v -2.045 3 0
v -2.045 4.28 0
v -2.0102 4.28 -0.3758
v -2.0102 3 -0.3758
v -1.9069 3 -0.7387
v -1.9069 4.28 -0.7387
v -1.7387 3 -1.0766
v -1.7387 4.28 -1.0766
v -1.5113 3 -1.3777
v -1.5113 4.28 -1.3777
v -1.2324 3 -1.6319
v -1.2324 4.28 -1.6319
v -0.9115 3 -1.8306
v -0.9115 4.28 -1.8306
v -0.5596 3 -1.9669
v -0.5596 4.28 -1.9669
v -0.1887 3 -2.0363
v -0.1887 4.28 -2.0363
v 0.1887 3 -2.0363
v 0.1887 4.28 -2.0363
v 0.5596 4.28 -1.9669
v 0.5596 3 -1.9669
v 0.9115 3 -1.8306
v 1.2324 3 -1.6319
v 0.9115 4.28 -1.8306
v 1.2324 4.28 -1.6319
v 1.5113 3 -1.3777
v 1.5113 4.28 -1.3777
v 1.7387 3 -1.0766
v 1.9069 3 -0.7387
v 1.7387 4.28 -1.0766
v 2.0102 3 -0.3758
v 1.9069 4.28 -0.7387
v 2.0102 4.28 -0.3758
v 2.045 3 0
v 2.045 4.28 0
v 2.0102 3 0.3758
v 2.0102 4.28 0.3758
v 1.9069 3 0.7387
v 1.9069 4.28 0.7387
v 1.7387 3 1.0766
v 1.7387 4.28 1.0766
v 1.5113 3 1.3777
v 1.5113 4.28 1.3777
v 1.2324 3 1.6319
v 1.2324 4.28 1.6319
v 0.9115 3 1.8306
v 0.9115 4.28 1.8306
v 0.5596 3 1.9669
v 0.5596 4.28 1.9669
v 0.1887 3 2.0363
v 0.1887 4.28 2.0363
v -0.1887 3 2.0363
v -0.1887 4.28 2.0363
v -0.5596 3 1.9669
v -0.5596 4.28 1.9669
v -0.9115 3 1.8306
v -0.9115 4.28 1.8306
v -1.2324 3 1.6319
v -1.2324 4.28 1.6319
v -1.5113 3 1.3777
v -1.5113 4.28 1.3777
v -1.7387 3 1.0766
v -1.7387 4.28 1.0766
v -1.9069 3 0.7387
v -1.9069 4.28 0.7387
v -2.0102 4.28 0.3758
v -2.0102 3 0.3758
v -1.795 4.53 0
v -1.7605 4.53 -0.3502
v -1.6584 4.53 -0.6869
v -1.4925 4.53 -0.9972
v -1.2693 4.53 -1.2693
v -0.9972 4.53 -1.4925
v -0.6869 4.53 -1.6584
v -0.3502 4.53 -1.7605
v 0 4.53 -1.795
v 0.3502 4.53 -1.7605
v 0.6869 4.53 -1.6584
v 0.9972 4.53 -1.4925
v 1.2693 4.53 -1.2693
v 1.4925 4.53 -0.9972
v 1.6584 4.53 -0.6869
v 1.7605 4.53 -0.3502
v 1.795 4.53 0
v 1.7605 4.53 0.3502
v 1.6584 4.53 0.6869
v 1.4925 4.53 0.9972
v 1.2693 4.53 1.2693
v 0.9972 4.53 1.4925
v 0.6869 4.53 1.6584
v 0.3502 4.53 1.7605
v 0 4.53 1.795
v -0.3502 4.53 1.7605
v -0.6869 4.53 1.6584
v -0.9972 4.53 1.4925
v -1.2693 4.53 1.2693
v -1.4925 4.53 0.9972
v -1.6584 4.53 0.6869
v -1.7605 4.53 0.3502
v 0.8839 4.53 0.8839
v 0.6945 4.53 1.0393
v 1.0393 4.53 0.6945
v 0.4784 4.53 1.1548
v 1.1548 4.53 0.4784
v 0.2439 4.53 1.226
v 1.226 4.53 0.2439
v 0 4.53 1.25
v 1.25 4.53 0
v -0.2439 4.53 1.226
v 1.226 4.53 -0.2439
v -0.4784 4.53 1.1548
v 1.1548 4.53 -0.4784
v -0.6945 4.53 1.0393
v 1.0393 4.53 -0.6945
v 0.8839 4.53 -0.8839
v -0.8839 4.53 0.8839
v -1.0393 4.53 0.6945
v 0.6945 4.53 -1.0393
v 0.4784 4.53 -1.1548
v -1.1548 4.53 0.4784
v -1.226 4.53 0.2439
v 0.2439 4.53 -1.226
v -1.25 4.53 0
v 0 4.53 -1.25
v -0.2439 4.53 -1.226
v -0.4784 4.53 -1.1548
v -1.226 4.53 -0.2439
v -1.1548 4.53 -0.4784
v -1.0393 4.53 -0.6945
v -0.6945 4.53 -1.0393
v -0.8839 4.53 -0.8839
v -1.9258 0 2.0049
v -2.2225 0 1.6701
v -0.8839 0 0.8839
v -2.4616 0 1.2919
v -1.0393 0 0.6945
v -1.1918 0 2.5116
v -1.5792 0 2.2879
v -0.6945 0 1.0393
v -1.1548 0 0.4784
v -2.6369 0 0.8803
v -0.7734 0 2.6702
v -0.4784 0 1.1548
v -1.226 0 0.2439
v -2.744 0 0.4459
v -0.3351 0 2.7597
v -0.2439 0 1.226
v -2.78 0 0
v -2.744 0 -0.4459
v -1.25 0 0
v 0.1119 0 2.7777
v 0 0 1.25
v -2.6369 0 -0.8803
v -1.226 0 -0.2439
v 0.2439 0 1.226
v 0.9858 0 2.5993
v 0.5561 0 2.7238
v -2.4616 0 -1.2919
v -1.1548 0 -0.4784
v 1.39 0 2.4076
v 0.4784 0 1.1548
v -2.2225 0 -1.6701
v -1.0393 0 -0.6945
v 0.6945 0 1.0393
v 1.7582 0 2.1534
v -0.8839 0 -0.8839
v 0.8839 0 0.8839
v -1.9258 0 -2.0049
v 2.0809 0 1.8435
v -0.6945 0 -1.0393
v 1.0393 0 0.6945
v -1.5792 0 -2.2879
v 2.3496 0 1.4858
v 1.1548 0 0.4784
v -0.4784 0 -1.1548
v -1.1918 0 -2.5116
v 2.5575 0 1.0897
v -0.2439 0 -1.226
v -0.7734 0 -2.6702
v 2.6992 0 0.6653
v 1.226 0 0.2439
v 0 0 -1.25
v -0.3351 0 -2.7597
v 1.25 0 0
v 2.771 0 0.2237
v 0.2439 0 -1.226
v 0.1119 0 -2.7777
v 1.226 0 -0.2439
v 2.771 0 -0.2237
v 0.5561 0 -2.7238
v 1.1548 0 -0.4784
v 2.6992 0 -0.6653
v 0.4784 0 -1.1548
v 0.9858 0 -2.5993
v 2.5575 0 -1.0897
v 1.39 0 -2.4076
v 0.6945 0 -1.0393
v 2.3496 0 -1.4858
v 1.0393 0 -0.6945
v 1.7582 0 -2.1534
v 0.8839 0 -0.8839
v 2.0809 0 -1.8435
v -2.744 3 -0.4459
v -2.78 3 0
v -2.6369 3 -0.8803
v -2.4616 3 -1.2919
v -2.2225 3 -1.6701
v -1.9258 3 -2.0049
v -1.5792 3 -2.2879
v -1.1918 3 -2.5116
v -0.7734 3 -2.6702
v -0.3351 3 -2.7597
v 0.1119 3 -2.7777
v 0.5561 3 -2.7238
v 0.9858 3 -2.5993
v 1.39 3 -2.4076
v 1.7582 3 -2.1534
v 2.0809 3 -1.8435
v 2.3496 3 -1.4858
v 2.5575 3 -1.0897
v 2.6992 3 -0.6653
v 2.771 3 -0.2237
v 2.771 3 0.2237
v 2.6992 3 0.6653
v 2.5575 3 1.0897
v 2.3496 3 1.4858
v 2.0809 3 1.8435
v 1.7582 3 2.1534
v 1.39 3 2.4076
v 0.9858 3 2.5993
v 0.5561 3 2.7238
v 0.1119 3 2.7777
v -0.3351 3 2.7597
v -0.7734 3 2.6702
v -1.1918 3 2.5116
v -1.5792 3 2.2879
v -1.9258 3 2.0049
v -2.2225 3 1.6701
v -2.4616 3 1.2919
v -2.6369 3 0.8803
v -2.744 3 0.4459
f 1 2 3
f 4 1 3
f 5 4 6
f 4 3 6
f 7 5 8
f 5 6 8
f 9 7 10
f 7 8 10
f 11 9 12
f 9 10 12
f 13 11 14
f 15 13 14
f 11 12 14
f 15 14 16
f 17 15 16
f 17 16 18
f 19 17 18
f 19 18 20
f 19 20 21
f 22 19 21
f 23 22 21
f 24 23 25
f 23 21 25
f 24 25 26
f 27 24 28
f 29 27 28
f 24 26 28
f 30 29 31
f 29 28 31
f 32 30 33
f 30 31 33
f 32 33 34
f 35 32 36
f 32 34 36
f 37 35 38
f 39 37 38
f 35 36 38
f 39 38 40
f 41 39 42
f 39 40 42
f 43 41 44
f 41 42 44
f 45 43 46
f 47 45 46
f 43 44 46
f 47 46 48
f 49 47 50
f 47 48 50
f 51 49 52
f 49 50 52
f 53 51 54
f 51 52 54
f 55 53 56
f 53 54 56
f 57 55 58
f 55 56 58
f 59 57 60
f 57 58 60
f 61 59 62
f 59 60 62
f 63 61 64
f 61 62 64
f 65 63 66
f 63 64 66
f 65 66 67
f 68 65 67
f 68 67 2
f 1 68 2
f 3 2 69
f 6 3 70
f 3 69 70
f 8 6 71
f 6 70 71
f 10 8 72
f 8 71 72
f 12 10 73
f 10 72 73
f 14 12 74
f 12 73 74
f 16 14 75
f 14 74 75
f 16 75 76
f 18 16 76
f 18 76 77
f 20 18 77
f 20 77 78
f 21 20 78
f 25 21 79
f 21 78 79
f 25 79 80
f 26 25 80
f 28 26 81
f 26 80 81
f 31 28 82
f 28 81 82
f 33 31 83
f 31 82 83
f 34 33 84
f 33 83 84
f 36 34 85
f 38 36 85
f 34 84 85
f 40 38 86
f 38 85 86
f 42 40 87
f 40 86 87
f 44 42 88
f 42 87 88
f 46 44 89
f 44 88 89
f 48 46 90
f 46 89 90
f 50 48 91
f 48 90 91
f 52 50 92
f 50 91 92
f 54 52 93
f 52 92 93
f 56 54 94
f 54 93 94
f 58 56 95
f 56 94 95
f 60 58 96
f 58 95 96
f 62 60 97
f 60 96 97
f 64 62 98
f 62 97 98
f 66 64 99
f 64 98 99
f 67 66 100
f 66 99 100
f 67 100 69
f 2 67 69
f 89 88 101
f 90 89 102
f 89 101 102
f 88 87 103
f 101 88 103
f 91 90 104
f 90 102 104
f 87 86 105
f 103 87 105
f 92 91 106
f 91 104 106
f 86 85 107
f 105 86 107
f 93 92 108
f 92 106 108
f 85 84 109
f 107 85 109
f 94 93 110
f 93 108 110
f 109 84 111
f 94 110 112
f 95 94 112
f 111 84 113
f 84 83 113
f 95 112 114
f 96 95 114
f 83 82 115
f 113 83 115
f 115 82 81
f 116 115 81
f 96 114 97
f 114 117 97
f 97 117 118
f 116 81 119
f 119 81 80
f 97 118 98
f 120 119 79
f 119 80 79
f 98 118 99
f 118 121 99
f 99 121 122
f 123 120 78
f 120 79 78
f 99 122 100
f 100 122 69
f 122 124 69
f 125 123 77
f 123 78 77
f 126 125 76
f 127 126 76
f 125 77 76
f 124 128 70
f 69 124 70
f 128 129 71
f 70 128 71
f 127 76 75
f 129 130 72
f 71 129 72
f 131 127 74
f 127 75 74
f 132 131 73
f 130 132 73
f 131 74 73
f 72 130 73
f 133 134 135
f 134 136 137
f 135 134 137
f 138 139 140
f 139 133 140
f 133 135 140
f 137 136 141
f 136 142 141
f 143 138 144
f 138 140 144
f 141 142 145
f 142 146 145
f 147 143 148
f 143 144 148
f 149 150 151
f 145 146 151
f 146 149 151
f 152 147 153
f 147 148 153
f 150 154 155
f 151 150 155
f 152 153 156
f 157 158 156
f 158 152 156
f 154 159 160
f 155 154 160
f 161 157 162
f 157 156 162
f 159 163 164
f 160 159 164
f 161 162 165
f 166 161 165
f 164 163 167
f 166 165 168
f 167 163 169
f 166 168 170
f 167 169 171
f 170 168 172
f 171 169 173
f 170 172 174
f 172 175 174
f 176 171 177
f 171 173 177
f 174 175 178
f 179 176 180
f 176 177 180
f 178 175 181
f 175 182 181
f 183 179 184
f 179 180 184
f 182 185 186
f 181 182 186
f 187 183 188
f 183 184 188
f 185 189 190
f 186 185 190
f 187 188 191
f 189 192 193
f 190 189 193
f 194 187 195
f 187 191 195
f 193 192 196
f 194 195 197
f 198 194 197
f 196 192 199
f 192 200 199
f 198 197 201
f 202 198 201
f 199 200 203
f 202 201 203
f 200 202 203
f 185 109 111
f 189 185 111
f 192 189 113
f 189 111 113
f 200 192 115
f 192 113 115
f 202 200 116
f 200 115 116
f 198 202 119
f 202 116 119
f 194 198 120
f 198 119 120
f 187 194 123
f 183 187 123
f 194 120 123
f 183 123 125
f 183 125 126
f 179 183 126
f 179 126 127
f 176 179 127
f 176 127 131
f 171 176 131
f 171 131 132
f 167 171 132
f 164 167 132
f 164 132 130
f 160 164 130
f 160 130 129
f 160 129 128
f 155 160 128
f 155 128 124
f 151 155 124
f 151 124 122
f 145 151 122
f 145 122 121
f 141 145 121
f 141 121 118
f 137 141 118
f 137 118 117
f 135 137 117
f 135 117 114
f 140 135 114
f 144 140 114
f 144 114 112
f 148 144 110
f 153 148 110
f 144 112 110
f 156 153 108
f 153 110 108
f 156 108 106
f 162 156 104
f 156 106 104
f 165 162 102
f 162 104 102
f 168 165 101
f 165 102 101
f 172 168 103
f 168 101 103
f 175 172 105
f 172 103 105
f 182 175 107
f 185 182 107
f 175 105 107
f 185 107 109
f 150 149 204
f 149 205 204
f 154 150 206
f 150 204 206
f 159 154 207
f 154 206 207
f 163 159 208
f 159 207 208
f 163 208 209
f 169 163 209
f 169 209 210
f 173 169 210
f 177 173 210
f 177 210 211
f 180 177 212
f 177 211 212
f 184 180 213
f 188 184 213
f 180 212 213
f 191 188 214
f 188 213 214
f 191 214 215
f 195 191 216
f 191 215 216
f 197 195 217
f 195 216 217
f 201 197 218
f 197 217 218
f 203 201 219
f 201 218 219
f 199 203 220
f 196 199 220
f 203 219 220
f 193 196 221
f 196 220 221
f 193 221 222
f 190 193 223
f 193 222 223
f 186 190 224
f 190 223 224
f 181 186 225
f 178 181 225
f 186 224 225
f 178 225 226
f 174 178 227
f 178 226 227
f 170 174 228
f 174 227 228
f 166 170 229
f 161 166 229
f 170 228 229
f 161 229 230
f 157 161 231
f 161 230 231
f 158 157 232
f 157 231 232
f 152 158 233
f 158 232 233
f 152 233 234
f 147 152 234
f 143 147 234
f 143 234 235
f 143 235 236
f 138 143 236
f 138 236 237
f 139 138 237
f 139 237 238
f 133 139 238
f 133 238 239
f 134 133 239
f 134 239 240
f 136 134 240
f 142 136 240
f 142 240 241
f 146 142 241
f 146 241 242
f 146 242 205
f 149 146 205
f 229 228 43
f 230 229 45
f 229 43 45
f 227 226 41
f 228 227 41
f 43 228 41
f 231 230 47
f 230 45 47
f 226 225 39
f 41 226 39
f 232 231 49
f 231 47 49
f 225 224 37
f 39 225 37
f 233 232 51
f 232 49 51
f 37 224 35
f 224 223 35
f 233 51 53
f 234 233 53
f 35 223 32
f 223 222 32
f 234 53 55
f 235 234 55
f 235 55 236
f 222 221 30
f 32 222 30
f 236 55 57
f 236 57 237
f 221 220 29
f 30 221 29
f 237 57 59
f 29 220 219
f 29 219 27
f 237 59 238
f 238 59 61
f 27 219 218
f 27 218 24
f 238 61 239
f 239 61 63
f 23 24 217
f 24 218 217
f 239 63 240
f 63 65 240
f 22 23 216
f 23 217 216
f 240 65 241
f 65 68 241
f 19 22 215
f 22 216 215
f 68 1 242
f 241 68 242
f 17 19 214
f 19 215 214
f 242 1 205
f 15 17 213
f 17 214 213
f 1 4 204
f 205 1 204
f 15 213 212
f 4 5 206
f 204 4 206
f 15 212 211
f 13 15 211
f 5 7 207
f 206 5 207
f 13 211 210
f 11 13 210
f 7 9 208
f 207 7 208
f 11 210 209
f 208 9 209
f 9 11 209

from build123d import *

# Parameters (mm, degrees)
TIP_CHAMFER_SIZE = 0.25
M3_TAPPED_HOLE_D = 2.5


with BuildPart() as part:
    # Body Sketch → Body Revolve (revolve)
    with BuildSketch(Plane.XY, mode=Mode.PRIVATE) as body_revolve_sk:
        Polygon((0, 0), (2.78, 0), (2.78, 3), (2.045, 3), (2.045, 4.53), (0, 4.53), align=None)
    revolve(body_revolve_sk.sketch.rotate(Axis((0, 4.53, 0), (0, -1, 0)), 180), axis=Axis((0, 4.53, 0), (0, -1, 0)))

    # Tip Chamfer
    tip_chamfer_edges = [part.edges().sort_by_distance(p)[0] for p in [
        (2.045, 4.53, 0),
    ]]
    chamfer(tip_chamfer_edges, length=TIP_CHAMFER_SIZE)

    # M3 Tapped Hole (through all)
    with Locations(Plane(origin=(0, 0, 0), x_dir=(-1, 0, 0), z_dir=(0, -1, 0))):
        with Locations((0, 0)):
            Hole(M3_TAPPED_HOLE_D / 2)


solid = part.part
